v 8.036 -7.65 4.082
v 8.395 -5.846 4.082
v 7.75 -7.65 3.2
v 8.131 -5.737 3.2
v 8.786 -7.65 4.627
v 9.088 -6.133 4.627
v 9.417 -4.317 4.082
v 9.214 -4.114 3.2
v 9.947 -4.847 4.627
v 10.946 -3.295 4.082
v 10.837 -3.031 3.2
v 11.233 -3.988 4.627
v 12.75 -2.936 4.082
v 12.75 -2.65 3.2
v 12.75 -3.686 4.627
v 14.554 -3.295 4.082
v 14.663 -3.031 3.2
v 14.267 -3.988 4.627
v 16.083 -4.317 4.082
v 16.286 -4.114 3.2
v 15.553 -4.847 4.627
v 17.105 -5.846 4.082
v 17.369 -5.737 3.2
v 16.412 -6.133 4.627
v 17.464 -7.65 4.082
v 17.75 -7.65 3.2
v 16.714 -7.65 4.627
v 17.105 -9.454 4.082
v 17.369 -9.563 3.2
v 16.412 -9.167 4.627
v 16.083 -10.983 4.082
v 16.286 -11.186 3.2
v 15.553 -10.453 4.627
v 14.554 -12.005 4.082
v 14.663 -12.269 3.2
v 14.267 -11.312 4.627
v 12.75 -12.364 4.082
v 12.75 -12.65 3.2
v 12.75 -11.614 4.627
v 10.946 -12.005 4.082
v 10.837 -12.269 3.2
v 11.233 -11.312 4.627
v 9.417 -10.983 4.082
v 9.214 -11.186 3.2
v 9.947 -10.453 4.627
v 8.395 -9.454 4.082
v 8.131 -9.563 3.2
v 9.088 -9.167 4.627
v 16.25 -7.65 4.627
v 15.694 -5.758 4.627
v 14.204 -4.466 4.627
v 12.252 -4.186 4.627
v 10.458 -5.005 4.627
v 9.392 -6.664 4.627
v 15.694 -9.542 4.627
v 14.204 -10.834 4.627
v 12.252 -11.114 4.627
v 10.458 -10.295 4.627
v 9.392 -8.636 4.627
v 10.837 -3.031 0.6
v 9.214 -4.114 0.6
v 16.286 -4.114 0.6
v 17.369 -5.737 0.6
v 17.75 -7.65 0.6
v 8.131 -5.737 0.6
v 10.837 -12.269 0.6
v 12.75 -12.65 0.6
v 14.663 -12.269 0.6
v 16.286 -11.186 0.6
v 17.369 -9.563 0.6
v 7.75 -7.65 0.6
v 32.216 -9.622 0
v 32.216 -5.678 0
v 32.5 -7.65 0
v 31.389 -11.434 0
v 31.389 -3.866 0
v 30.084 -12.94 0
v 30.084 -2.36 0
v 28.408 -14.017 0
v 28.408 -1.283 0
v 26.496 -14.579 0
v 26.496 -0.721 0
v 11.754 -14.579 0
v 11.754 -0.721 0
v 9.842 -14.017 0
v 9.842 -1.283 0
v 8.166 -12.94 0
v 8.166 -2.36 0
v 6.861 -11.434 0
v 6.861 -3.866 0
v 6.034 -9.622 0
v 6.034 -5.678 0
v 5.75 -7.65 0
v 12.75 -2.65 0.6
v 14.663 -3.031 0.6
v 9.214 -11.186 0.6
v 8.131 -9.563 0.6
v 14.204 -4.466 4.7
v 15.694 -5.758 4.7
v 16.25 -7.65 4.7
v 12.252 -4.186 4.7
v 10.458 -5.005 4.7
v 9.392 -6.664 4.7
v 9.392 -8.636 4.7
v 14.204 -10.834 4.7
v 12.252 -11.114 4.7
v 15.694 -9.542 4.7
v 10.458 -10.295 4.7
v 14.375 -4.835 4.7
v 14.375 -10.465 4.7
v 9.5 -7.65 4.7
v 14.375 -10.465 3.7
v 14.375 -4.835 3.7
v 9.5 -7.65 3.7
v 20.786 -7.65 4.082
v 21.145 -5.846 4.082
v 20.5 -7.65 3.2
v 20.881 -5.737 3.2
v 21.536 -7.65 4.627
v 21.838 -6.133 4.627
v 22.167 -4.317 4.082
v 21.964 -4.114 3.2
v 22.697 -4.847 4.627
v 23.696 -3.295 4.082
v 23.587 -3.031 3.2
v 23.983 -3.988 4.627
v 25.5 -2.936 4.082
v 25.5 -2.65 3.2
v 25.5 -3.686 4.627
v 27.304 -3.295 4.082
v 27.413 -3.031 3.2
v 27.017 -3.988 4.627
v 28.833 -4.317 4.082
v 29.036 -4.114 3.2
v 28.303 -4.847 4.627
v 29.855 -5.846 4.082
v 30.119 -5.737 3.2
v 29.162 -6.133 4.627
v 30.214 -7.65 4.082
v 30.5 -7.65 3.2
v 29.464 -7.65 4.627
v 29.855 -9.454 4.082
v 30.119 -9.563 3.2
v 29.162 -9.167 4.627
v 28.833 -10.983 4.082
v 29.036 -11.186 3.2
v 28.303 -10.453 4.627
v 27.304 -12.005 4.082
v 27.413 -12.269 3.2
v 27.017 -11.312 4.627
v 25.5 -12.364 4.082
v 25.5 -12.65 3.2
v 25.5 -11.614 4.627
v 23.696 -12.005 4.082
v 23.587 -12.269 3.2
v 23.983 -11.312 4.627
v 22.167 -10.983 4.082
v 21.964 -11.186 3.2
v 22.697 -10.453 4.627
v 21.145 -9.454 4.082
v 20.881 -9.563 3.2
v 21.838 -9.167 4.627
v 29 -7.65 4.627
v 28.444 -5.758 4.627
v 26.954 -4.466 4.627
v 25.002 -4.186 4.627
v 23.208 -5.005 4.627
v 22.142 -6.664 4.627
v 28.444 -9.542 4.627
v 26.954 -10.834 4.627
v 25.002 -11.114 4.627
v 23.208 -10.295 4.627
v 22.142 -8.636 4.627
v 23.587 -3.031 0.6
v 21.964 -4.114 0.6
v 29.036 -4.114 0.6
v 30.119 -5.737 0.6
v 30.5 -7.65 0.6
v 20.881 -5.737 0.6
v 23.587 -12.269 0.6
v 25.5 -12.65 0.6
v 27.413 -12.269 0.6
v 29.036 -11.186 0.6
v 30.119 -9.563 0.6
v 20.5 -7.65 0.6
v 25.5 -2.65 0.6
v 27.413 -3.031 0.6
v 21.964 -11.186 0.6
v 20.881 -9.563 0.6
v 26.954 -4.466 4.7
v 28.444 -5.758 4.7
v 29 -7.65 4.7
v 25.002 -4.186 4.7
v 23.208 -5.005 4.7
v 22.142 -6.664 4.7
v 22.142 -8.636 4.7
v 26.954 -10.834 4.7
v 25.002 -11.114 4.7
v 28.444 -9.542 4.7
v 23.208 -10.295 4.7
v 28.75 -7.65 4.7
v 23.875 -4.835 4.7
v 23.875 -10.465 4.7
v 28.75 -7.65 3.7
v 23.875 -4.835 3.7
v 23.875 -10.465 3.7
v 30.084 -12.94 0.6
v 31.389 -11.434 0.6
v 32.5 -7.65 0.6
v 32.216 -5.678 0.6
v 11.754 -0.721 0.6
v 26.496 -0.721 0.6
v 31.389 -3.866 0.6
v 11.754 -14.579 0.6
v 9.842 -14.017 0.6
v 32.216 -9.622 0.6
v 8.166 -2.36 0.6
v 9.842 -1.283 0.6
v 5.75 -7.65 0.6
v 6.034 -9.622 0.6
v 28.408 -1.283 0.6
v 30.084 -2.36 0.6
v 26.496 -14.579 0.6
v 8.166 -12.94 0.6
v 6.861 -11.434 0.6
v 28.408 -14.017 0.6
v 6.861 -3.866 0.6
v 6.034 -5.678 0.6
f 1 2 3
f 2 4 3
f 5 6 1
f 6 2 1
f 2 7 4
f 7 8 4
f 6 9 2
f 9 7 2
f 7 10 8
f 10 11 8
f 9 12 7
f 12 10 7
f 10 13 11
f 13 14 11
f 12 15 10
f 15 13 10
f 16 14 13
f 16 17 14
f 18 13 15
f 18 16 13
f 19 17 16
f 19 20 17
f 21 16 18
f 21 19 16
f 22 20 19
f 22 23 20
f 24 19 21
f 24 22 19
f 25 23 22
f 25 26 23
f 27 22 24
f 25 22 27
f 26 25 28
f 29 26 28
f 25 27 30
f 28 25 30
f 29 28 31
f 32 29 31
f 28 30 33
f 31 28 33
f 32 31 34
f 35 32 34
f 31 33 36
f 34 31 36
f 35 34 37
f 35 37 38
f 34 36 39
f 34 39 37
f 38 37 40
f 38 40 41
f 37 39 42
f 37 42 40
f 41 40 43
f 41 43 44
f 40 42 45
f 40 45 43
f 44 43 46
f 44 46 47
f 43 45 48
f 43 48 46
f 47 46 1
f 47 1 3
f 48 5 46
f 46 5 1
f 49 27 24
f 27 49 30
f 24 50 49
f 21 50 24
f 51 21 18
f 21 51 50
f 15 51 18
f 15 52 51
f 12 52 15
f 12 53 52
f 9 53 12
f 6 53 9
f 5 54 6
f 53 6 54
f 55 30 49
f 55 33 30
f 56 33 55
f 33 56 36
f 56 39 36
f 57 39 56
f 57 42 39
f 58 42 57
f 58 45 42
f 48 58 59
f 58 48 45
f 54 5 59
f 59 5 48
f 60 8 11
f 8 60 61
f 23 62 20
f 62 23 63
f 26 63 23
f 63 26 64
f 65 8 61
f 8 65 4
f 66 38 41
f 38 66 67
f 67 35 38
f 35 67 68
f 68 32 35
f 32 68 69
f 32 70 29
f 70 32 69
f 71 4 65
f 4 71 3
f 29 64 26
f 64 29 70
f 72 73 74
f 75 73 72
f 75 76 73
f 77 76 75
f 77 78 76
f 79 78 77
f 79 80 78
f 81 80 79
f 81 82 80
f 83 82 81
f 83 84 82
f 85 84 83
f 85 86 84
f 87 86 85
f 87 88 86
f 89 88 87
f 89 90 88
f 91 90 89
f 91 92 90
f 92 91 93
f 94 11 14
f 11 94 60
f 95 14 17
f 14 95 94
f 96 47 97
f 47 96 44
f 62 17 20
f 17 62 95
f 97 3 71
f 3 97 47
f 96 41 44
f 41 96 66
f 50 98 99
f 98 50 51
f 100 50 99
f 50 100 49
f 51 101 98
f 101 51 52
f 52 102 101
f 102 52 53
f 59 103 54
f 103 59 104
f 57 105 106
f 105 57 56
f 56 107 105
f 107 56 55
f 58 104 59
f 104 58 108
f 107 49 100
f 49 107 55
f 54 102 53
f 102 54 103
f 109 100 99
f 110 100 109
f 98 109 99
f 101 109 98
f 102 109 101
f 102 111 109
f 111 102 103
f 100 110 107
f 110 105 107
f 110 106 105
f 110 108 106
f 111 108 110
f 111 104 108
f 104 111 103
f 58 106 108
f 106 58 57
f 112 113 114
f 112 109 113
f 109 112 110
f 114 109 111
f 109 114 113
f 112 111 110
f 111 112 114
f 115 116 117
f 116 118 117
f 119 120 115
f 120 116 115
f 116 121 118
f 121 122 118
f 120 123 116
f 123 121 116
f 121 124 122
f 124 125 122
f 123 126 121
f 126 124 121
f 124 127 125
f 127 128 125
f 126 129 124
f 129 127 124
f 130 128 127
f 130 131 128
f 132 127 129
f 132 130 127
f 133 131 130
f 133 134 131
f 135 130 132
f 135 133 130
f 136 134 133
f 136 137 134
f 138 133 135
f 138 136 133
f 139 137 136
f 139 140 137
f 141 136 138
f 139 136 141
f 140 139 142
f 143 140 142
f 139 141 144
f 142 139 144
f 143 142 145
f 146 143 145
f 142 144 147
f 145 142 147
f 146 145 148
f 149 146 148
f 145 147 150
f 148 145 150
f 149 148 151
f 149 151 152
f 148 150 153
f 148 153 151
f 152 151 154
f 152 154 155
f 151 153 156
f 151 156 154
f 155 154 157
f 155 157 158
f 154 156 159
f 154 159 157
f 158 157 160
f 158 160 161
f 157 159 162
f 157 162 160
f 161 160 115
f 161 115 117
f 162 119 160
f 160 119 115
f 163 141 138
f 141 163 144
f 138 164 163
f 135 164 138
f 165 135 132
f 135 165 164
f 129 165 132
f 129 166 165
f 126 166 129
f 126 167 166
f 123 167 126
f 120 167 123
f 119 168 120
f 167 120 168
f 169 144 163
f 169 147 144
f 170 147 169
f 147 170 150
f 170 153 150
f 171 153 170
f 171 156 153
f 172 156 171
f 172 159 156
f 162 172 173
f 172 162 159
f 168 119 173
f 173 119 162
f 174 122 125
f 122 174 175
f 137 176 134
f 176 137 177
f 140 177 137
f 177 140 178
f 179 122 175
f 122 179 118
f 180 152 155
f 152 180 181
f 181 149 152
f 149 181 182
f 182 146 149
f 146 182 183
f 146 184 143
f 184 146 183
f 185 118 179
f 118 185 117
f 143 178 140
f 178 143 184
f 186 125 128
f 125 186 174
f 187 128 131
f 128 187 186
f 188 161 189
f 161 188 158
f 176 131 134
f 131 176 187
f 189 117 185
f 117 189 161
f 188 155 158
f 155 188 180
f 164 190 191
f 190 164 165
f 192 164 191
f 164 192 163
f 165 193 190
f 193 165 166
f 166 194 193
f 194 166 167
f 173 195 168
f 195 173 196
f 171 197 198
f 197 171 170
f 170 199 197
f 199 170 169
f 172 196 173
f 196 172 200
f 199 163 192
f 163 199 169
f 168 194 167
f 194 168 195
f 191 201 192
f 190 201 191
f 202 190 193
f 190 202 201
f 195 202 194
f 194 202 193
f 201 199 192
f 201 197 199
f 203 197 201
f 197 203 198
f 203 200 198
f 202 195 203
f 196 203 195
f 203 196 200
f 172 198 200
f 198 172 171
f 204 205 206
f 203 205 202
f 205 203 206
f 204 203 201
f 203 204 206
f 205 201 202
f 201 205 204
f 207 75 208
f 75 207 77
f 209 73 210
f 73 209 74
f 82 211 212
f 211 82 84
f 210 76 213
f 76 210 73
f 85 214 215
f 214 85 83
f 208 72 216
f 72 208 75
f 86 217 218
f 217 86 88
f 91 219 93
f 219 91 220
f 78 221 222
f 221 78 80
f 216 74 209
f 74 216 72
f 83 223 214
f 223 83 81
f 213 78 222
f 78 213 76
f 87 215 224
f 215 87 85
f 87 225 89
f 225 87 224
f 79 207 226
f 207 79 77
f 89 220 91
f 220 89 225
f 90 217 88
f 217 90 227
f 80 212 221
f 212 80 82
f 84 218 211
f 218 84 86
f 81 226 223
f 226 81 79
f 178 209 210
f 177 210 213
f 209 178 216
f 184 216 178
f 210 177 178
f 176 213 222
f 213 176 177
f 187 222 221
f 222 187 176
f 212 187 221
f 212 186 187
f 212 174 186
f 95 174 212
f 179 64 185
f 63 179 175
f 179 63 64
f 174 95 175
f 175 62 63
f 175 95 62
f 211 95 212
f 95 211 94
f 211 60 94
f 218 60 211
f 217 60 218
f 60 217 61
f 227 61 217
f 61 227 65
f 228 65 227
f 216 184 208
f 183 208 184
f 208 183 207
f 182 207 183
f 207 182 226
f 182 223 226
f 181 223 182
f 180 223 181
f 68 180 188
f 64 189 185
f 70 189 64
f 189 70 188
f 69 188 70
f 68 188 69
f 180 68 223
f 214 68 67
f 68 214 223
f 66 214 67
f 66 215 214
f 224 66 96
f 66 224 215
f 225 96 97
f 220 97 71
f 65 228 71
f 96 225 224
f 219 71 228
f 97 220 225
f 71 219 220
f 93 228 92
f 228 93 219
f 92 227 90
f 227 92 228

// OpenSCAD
// file: tvRemoteControl-Buttons.scad
pitch=2.55;
width = 10;
thickness=0.6;
height=thickness + 4.1;
extra=2;
roundness=1.5;
textHeight=1;

module button(x,y)
{
    translate( [x*pitch, y*pitch] ) {
        difference() {
            union() {
                translate( [0,0,height-roundness] ) rotate_extrude( angle = 360, convexity = 6 ) {
                    translate( [width/2-roundness,0] ) circle( r=roundness, $fn=10 );
                }
                cylinder( d=width, h=height-roundness );
                cylinder( d=width-roundness*2, h=height );
            }
            translate( [0,0,height-textHeight] ) linear_extrude( textHeight+1 ) children();
        }
    }
}

module base(x,y)
{
    translate( [x*pitch, y*pitch] ) {
        cylinder( d=width+extra*2, thickness );
    }
}

module letter( t )
{
    text( t=t, halign="center", valign="center" );
}

module arrow()
{
    circle( d= width-roundness-2, $fn=3 );
}

module minus()
{
    square( [width-roundness-2, 2], center=true );
}

module plus()
{
    minus();
    rotate( 90 ) minus();
}
// main file
use <tvRemoteControl-Buttons.scad>;


module leftRight()
{    
    button(5,-3) rotate(180) arrow();
    button(10,-3) arrow();
    
    hull() {
        base(5,-3);
        base(10,-3);
    }
}

leftRight();
